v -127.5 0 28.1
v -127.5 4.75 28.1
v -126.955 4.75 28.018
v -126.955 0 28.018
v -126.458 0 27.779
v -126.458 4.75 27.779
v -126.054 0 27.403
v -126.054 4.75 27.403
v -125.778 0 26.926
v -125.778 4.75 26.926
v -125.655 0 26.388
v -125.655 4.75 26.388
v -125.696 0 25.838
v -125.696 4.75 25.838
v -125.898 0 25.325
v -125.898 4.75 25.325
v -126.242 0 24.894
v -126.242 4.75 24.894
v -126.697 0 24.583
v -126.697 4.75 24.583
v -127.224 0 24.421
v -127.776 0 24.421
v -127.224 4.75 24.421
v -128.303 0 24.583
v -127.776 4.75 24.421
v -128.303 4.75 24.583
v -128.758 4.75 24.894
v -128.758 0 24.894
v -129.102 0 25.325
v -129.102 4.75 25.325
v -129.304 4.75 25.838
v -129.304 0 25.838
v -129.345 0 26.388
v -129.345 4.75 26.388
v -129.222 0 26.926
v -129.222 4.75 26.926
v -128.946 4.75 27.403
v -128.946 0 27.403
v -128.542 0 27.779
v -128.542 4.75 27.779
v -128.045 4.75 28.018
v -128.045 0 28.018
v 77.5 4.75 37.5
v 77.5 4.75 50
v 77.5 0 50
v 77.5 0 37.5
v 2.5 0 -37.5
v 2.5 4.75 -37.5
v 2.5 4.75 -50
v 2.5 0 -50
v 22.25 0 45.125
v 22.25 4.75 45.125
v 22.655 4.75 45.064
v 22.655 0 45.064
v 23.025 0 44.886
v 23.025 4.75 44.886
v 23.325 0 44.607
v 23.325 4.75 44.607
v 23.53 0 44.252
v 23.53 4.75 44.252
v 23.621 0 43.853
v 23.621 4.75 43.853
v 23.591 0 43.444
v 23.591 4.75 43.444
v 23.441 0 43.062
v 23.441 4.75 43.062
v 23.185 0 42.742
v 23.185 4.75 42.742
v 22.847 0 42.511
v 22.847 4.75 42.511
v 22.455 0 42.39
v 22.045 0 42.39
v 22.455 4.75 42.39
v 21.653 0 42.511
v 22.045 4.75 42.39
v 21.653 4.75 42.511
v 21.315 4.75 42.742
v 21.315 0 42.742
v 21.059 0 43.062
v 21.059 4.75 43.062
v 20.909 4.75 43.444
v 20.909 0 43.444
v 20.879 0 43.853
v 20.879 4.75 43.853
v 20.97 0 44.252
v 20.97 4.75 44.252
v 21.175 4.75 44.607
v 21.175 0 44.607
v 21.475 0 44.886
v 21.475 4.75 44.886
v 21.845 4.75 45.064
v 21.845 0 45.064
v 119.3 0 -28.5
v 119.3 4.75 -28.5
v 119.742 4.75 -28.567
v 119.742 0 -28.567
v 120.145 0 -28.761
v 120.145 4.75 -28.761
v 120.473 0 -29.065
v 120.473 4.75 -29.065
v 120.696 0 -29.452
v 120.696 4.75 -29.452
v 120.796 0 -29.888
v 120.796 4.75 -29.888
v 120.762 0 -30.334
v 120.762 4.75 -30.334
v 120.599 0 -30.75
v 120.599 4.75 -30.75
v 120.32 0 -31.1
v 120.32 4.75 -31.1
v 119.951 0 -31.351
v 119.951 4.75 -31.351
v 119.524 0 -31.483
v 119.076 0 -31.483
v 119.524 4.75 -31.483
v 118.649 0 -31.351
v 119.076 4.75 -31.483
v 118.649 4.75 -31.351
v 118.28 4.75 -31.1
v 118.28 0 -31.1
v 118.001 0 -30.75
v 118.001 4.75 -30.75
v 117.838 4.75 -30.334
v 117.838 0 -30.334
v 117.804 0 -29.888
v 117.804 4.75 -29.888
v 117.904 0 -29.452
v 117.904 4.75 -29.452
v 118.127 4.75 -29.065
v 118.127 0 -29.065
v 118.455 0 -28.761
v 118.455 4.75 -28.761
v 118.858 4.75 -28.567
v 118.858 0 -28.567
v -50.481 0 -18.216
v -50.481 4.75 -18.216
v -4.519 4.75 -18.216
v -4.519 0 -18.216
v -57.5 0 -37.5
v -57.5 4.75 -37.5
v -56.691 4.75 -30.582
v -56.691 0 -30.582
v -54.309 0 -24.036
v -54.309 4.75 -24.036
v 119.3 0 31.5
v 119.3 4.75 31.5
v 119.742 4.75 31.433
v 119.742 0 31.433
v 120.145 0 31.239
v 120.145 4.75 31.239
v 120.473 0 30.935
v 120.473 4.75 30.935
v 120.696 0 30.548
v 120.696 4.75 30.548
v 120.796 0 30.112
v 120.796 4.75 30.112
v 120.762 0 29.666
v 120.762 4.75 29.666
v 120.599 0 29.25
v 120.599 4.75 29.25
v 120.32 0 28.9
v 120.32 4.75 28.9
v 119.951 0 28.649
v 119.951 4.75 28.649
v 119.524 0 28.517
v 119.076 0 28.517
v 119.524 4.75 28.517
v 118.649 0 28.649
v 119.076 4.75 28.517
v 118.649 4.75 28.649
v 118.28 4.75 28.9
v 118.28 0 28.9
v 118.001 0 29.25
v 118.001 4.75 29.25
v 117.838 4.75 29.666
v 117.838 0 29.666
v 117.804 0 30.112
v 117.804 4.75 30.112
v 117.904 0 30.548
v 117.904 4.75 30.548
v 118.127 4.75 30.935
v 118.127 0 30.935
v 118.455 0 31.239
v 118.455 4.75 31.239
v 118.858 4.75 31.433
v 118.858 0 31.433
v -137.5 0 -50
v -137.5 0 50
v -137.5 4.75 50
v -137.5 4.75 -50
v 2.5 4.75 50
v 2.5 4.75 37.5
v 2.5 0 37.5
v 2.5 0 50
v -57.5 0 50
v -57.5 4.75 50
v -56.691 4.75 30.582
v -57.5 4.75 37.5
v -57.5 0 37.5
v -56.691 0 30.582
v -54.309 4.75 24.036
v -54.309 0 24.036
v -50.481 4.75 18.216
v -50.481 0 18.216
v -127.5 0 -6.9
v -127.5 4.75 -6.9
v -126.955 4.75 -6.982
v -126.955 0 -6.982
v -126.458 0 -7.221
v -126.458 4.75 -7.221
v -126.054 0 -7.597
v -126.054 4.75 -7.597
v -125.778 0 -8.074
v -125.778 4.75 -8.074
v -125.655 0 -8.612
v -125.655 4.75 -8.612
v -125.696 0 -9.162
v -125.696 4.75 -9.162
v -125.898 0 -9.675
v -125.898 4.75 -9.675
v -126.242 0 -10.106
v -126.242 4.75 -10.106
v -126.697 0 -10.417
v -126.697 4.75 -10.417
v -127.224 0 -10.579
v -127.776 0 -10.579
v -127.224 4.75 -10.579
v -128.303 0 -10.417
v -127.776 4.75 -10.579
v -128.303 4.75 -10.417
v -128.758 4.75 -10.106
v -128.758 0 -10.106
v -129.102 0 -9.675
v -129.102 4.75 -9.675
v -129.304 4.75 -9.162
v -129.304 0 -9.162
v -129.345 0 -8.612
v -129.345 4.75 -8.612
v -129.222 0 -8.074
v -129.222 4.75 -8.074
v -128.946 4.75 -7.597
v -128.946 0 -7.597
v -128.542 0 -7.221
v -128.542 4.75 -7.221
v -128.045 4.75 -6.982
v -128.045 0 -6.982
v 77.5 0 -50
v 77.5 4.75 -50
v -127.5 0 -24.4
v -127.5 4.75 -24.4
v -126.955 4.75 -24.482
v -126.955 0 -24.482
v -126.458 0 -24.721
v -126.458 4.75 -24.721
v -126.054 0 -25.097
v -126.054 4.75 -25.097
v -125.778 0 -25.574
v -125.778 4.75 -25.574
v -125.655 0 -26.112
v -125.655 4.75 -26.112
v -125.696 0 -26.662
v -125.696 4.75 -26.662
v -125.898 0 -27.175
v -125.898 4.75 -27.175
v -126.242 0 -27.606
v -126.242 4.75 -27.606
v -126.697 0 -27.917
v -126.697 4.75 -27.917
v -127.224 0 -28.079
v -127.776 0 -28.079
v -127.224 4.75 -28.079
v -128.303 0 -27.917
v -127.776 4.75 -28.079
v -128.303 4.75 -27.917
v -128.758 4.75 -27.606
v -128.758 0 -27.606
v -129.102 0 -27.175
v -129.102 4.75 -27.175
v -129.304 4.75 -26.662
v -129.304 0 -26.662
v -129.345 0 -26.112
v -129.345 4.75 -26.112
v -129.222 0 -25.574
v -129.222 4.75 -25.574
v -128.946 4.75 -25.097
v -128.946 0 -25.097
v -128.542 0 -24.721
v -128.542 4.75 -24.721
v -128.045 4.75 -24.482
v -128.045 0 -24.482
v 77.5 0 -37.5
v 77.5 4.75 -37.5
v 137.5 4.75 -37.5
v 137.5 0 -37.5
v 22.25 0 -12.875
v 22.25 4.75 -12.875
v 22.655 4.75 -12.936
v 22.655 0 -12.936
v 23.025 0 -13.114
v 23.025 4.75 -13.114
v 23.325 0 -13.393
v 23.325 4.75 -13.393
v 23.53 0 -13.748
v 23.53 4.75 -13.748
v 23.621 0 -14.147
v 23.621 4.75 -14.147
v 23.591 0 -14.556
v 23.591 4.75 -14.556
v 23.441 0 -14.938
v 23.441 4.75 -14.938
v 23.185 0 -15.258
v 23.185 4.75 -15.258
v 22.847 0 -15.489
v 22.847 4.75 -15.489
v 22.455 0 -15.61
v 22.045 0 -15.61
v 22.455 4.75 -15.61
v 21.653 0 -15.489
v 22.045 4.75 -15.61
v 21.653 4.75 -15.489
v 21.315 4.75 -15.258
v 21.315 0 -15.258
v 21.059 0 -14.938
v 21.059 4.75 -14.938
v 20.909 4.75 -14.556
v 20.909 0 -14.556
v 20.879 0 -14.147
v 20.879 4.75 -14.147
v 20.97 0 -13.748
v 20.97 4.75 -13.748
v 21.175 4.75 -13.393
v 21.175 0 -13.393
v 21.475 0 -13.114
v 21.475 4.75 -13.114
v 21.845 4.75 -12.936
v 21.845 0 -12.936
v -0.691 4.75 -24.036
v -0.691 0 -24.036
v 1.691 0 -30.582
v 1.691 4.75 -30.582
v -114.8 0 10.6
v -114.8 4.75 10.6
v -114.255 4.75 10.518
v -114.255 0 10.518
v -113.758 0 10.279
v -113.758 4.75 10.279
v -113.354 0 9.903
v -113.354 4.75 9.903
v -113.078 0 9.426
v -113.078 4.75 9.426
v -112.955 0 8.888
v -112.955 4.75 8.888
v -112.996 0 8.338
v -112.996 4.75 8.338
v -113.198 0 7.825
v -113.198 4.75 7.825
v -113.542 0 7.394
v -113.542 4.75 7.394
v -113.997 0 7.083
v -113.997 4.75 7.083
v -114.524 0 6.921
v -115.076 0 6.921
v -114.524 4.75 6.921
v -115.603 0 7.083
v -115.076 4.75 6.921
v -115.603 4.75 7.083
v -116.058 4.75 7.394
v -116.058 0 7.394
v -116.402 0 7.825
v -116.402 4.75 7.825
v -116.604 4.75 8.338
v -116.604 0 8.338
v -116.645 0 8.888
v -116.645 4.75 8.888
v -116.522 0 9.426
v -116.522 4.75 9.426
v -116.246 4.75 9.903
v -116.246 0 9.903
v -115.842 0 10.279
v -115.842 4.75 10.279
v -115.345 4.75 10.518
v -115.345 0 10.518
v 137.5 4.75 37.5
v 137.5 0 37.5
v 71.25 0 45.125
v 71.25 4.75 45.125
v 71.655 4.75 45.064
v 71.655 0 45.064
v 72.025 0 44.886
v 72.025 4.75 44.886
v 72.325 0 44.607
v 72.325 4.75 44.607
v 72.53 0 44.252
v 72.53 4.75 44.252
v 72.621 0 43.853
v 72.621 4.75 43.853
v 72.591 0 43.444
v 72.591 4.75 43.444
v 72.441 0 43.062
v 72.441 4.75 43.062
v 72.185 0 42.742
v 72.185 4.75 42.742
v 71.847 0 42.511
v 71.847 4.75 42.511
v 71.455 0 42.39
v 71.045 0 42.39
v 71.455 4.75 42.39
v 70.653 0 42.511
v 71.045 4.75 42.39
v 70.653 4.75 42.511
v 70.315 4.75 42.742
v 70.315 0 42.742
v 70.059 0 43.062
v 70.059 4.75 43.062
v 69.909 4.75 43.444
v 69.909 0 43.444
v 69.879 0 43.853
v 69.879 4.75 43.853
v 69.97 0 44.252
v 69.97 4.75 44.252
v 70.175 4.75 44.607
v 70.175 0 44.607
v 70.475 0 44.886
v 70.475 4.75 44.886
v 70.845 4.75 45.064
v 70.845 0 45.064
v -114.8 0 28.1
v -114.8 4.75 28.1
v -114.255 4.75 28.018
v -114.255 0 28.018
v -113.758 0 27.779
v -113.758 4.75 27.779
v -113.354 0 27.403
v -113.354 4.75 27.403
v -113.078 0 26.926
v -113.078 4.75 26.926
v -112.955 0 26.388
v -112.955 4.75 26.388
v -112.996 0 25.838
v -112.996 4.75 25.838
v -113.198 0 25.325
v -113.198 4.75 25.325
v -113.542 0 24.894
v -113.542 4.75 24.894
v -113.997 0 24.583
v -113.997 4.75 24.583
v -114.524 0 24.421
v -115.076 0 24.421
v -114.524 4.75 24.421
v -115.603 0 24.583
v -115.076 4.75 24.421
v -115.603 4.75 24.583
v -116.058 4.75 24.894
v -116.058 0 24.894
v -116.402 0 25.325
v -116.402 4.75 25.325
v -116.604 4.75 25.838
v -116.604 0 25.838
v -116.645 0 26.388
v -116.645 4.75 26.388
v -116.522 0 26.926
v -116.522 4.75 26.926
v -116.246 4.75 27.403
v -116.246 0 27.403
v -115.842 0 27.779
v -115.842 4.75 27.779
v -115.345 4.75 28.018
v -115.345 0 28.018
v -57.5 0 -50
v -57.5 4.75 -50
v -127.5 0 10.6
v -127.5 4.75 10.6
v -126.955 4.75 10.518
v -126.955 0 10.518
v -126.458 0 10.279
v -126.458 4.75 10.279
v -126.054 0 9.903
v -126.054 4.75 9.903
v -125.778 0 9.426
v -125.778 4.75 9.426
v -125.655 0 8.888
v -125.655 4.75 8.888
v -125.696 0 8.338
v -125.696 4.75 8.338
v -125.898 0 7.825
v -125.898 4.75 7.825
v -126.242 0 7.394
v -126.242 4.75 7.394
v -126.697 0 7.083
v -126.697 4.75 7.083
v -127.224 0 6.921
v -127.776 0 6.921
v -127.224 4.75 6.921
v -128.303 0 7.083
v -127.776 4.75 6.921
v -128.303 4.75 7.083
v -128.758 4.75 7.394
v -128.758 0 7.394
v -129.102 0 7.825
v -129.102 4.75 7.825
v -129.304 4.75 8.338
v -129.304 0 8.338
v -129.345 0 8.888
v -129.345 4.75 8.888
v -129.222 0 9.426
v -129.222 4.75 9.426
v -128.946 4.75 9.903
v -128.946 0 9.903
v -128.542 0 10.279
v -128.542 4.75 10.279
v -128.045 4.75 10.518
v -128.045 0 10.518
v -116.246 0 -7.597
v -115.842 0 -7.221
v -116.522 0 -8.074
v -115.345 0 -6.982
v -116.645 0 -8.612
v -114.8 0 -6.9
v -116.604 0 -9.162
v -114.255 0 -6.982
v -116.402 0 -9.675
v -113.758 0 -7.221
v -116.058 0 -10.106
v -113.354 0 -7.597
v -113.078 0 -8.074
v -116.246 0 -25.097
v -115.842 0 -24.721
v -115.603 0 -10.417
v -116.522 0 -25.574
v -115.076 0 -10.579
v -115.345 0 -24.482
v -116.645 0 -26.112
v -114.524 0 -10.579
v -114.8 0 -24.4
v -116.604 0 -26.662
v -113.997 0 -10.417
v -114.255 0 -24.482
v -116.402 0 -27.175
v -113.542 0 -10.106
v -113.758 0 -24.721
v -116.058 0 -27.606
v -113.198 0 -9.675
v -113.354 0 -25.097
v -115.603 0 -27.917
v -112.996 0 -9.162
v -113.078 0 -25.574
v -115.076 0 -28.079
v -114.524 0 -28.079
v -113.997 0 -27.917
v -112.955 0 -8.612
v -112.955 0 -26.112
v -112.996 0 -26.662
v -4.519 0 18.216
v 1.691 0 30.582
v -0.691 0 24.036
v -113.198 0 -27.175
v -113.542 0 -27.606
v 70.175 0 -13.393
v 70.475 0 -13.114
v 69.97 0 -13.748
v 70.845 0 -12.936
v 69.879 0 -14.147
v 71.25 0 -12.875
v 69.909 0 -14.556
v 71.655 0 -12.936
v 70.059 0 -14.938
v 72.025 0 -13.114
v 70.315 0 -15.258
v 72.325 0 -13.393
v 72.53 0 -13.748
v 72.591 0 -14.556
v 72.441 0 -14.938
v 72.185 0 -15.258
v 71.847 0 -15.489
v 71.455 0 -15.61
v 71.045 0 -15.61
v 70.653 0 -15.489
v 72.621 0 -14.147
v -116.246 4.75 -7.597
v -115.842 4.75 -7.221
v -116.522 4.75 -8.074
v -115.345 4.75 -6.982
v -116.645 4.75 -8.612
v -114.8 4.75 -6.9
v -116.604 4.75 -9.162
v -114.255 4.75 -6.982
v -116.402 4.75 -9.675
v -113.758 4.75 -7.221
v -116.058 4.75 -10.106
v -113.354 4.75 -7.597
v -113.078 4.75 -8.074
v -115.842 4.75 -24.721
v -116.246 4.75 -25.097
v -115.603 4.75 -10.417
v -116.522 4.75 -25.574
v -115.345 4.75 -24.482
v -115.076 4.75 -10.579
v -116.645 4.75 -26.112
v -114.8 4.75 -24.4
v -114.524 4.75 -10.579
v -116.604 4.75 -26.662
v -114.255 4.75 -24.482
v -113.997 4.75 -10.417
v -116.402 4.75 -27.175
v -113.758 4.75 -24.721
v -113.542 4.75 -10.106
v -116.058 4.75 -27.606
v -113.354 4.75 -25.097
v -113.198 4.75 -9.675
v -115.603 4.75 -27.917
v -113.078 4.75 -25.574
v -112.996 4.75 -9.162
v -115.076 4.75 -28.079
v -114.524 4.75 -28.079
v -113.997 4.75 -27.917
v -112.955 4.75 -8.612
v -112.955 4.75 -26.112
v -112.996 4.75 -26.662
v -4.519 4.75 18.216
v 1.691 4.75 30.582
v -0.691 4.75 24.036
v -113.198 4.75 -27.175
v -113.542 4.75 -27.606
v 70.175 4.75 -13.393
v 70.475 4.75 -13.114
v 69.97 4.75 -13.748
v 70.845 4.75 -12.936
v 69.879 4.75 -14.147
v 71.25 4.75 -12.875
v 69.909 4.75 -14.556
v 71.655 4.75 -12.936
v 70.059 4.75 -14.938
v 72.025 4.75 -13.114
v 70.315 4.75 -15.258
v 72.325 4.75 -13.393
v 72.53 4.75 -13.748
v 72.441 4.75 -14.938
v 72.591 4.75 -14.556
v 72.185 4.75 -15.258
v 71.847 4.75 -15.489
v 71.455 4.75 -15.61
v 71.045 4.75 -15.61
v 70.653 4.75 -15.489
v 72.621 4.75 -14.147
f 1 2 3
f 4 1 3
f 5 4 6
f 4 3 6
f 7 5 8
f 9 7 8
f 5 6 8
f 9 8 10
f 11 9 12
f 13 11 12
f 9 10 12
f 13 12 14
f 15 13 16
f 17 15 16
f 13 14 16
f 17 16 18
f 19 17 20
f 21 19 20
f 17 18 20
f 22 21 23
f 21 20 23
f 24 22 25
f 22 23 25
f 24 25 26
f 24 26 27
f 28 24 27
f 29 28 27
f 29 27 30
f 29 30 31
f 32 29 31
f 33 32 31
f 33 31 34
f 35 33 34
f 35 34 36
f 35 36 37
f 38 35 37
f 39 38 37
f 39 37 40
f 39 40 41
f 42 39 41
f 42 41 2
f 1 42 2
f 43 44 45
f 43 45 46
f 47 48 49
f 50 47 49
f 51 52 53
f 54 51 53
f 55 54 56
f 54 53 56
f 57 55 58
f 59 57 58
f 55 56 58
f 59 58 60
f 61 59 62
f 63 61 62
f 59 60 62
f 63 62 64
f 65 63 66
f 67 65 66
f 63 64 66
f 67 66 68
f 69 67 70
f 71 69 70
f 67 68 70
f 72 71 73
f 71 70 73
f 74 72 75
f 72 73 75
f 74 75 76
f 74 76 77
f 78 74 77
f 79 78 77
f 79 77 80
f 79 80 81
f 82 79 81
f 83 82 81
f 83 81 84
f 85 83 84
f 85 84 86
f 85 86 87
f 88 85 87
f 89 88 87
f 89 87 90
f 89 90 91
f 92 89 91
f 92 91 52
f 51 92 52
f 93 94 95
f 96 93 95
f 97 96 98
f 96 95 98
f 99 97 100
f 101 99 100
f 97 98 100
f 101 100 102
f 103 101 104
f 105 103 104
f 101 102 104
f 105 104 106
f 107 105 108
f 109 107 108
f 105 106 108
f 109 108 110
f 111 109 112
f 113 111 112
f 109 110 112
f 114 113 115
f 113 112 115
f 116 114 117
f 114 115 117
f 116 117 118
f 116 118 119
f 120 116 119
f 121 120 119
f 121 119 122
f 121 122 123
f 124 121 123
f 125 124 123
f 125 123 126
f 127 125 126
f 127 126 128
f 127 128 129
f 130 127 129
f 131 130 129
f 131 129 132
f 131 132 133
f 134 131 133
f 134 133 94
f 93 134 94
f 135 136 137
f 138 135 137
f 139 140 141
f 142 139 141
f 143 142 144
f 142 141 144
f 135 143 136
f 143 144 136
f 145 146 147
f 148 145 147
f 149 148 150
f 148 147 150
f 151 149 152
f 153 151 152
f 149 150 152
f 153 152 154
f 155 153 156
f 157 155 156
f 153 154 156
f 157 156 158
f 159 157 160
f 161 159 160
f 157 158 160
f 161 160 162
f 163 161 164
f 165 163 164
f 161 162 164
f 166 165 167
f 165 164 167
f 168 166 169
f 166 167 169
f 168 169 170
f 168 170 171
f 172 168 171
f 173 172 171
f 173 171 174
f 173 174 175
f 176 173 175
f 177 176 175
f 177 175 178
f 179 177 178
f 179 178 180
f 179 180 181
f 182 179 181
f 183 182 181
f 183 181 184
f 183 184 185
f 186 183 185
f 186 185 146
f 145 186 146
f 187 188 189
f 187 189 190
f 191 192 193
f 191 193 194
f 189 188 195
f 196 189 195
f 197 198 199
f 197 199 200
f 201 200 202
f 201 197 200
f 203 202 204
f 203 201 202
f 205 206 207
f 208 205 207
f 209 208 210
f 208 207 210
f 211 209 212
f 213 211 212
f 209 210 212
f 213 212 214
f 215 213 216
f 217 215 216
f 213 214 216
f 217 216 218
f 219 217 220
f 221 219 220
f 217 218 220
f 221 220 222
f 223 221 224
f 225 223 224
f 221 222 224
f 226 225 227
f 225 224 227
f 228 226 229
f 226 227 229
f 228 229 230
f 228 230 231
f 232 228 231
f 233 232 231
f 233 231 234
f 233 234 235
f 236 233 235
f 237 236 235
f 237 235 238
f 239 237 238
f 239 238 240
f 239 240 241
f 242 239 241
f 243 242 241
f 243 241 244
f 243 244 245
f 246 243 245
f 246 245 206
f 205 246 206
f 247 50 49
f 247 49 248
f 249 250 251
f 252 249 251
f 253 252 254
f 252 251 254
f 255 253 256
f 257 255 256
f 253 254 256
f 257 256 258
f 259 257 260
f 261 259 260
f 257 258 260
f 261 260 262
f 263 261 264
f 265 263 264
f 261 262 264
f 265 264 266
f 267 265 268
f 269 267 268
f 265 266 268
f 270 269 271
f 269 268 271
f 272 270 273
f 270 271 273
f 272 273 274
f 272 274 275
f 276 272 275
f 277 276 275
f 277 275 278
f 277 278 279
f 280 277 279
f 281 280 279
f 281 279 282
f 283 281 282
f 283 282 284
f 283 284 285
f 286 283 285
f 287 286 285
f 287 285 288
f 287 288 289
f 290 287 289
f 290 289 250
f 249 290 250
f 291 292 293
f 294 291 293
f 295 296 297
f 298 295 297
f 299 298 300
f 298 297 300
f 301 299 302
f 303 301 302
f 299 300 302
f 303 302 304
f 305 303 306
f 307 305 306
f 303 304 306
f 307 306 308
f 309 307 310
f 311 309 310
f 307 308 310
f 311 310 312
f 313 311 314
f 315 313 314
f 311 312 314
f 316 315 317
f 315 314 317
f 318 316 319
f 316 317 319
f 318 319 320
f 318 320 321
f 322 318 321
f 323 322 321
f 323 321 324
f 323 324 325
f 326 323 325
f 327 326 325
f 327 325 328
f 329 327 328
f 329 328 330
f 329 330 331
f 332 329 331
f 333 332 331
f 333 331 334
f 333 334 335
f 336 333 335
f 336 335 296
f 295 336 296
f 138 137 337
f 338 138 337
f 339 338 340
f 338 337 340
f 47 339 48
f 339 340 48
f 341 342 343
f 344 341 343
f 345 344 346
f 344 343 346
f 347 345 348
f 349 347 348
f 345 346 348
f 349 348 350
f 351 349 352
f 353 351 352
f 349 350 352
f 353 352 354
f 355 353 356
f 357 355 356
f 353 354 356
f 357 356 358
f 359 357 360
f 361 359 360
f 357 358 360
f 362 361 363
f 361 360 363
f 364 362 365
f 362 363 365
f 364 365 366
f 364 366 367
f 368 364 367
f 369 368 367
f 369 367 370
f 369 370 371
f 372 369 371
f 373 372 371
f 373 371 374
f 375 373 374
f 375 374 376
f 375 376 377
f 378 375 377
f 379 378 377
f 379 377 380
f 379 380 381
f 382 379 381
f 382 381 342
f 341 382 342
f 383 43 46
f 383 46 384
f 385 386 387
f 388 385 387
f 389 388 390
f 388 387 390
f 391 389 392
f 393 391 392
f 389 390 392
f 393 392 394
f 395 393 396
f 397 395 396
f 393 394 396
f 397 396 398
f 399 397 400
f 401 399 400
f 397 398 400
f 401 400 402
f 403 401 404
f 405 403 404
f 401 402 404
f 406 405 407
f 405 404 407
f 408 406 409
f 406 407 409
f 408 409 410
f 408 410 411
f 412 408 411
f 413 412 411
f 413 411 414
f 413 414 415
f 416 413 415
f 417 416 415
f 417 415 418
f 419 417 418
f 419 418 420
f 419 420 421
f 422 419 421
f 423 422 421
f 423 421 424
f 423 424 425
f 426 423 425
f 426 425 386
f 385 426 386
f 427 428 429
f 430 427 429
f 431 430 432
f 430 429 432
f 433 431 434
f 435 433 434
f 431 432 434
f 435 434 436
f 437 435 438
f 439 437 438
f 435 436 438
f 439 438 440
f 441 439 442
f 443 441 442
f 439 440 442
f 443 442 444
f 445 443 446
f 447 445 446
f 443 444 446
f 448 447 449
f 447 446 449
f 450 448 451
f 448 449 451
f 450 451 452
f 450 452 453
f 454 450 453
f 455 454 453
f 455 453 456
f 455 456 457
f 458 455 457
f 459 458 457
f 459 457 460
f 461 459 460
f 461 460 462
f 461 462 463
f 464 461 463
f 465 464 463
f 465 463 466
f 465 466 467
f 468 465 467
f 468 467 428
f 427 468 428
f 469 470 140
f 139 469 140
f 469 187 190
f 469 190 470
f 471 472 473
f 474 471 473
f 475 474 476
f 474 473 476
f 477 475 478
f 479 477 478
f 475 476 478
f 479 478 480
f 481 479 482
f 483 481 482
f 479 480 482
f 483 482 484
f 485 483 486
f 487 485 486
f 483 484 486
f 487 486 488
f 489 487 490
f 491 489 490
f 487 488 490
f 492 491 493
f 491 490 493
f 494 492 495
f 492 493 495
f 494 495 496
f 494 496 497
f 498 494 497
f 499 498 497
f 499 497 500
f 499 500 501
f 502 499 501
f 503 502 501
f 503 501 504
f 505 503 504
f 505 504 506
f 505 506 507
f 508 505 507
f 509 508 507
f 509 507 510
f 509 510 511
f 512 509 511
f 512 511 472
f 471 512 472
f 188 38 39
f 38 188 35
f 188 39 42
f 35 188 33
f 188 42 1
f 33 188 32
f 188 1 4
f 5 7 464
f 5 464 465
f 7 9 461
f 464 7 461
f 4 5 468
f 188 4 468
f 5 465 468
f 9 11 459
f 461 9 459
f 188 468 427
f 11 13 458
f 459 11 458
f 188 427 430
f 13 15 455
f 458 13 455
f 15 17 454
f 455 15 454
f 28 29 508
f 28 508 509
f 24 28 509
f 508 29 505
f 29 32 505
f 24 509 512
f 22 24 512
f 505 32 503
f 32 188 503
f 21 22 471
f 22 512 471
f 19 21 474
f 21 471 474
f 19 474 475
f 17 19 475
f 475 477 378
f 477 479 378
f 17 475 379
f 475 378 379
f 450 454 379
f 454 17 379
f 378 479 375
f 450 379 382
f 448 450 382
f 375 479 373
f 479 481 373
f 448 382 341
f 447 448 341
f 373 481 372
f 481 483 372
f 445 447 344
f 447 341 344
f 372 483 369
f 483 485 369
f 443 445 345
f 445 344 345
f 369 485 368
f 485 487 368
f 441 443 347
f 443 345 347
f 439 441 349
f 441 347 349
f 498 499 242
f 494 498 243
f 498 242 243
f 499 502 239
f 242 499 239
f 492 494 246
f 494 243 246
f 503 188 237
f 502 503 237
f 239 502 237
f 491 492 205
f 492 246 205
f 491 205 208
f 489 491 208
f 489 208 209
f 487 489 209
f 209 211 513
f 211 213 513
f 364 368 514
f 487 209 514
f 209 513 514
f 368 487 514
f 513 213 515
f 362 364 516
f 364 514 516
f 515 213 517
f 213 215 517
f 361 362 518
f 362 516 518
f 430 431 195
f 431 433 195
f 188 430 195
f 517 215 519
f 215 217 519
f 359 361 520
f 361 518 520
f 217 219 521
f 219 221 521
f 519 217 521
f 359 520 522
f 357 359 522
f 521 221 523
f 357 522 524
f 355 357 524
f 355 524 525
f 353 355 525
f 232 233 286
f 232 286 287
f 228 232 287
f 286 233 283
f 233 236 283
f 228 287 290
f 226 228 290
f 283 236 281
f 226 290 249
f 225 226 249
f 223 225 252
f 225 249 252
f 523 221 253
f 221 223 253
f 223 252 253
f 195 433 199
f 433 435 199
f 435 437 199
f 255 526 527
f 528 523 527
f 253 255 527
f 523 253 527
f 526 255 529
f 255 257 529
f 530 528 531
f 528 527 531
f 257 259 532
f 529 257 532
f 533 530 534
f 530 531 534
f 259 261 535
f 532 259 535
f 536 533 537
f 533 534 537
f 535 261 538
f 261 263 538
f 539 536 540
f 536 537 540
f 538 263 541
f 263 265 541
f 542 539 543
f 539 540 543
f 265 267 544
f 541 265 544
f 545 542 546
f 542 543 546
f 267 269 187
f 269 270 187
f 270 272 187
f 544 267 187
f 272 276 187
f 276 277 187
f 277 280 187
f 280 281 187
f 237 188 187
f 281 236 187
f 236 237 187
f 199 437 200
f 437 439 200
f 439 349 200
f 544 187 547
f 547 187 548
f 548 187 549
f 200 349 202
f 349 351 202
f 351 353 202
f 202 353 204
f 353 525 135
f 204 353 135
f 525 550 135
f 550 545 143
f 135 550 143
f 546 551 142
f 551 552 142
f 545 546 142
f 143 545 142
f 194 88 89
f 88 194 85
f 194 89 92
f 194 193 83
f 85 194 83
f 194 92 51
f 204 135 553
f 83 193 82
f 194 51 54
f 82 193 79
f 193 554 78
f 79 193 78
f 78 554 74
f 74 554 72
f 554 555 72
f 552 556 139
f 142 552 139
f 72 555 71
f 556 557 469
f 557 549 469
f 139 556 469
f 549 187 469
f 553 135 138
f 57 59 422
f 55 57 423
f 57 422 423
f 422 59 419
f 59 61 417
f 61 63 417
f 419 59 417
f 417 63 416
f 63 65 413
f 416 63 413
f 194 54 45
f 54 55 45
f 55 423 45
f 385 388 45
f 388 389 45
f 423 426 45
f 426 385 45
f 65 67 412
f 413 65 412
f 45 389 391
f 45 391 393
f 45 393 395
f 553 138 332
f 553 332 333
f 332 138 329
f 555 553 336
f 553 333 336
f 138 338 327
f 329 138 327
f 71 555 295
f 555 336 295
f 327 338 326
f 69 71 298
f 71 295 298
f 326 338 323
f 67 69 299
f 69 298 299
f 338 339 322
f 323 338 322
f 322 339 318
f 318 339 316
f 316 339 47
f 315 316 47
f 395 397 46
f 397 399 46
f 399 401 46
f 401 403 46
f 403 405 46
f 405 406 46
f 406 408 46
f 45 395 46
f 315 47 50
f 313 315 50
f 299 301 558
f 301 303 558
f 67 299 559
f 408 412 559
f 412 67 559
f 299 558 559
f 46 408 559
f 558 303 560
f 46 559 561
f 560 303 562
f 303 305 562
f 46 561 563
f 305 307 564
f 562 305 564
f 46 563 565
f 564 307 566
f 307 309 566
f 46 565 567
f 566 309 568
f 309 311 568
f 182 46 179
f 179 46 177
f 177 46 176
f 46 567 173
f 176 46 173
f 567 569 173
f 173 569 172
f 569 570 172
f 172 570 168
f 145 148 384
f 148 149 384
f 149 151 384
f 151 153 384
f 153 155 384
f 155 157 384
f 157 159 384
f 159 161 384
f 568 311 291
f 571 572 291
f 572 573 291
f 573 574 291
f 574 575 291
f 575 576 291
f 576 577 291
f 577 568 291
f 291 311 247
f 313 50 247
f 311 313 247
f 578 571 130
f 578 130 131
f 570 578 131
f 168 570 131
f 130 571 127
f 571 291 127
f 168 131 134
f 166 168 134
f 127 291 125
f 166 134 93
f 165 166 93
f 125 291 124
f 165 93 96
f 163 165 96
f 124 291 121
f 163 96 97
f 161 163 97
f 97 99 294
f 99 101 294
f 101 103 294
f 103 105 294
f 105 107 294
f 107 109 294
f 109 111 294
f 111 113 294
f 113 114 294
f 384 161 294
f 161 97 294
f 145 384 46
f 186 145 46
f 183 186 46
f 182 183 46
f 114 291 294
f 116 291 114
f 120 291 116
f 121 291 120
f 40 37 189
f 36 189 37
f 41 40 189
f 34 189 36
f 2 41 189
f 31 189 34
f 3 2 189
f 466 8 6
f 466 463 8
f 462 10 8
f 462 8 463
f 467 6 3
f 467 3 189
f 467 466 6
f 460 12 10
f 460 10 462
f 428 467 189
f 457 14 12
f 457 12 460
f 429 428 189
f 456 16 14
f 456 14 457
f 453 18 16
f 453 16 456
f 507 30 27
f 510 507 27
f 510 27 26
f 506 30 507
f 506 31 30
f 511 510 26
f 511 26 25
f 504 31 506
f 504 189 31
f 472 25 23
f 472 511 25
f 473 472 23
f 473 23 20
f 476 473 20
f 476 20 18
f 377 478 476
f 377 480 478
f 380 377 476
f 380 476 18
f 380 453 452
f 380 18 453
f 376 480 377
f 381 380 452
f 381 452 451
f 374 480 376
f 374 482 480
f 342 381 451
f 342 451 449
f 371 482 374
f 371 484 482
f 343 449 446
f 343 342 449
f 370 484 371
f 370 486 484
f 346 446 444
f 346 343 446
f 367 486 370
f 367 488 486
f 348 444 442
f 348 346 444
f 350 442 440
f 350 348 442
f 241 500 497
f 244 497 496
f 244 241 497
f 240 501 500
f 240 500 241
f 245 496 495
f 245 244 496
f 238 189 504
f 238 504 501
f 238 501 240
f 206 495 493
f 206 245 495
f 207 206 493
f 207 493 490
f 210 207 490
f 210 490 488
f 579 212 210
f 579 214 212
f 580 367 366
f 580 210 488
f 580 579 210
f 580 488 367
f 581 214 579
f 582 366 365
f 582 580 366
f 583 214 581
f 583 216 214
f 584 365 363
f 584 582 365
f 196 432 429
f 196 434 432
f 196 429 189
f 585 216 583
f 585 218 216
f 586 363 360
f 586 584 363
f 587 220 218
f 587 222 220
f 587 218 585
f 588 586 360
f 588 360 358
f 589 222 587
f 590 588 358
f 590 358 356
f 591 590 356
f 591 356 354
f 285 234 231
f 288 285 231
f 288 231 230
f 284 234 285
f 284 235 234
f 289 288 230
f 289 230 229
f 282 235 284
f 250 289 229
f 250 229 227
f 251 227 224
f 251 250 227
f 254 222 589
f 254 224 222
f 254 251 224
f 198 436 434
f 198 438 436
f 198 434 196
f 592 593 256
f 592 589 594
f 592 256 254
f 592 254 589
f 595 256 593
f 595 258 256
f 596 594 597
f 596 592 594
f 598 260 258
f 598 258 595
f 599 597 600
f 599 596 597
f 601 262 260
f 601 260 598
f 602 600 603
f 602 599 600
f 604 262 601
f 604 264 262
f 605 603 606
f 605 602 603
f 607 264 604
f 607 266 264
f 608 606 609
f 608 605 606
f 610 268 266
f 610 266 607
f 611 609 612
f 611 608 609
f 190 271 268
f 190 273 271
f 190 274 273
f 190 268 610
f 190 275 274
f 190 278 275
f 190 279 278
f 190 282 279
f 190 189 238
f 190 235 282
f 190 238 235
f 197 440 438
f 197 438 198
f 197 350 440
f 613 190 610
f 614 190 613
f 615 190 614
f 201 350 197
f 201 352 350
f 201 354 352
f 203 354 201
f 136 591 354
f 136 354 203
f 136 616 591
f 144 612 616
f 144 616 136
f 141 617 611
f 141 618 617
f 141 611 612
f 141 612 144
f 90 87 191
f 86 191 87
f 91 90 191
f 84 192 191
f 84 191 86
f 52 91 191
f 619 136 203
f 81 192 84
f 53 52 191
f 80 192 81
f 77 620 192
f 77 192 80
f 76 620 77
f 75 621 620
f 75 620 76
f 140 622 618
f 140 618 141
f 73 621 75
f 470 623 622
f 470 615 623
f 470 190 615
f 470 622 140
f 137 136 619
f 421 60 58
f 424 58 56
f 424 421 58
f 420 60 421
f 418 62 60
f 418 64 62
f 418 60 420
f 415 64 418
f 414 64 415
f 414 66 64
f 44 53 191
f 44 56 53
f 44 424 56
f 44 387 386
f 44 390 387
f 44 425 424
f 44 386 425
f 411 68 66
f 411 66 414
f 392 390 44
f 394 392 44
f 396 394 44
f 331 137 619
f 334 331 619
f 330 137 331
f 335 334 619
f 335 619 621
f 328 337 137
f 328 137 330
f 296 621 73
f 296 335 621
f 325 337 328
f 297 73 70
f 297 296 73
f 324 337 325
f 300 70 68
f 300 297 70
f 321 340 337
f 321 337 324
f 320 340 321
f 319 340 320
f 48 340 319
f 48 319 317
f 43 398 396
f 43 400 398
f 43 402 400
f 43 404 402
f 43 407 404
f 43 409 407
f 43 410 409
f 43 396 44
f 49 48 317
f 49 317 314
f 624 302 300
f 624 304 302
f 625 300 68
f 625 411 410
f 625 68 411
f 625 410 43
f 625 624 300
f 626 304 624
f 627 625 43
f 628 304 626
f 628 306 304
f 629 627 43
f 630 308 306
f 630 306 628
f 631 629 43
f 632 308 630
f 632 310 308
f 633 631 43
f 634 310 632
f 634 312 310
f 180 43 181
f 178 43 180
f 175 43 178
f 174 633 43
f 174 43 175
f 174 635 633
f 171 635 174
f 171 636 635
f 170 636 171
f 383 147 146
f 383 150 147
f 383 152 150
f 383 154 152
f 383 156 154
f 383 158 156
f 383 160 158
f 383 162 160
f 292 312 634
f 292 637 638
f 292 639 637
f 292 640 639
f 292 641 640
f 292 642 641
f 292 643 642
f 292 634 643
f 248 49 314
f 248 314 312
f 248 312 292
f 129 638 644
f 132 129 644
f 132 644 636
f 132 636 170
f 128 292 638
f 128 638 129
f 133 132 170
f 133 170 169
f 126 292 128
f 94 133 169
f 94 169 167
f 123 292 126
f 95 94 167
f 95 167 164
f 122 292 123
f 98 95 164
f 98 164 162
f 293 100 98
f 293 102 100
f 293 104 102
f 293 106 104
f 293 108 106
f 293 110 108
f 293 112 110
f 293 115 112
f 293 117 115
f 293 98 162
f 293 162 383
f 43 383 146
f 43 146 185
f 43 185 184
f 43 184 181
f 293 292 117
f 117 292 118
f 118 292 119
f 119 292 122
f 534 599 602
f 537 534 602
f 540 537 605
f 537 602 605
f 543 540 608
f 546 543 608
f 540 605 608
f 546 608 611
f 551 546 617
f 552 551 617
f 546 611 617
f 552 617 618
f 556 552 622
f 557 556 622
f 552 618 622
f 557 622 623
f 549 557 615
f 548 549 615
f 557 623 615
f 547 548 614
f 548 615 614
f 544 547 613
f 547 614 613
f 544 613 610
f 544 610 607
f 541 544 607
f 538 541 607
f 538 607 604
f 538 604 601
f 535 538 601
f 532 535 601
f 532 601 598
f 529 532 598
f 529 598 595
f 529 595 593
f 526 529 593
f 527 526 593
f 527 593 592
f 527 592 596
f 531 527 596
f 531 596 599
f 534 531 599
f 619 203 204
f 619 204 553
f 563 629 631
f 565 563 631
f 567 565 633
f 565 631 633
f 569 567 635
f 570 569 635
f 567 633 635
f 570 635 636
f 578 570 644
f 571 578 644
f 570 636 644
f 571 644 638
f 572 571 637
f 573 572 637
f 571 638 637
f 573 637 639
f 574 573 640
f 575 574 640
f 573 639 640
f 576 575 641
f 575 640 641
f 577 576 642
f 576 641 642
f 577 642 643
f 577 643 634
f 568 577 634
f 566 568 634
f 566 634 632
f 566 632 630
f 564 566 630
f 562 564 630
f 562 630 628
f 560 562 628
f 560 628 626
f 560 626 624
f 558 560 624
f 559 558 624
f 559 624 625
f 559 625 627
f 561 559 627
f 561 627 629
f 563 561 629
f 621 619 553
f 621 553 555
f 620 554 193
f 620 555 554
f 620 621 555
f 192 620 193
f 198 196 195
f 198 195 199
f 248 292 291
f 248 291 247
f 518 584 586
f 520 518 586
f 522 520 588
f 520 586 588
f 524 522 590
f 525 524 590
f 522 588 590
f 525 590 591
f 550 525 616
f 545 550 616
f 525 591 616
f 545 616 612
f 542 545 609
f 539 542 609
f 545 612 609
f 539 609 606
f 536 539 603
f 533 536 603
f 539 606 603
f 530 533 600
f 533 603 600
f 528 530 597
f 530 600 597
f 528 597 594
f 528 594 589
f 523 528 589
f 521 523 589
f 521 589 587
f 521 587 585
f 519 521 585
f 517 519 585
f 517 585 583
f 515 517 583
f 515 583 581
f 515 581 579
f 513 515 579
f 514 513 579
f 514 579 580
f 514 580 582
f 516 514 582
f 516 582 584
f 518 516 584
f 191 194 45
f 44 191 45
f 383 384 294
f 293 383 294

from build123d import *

# Parameters (mm, degrees)
SKETCH1_W           = 275
SKETCH1_H           = 100
BOSS_EXTRUDE4_DEPTH = 4.75
SKETCH3_R           = 1.5
SKETCH3_W           = 60
SKETCH3_H           = 12.5
CUT_EXTRUDE1_DEPTH  = 10
SKETCH4_R           = 1.85
SKETCH4_R_2         = 1.375
CUT_EXTRUDE2_DEPTH  = 10


with BuildPart() as part:
    # Sketch1 → Boss-Extrude4 (new body)
    with BuildSketch(Plane(origin=(0, 0, 0), x_dir=(1, 0, 0), z_dir=(0, 1, 0))):
        Rectangle(SKETCH1_W, SKETCH1_H)
    extrude(amount=BOSS_EXTRUDE4_DEPTH)

    # Sketch3 → Cut-Extrude1 (cut)
    with BuildSketch(Plane(origin=(0, 4.75, 0), x_dir=(1, 0, 0), z_dir=(0, 1, 0))):
        with Locations(Location((119.3, -30, 0), (0, 0, 270))):
            Circle(SKETCH3_R)
        with Locations(Location((119.3, 30, 0), (0, 0, 270))):
            Circle(SKETCH3_R)
        with Locations((107.5, -43.75)):
            Rectangle(SKETCH3_W, SKETCH3_H)
        with Locations((107.5, 43.75)):
            Rectangle(SKETCH3_W, SKETCH3_H)
        with BuildLine():
            Line((2.5, -50), (-57.5, -50))
            Line((-57.5, -50), (-57.5, -37.5))
            ThreePointArc((-57.5, -37.5), (-55.690778624, -27.2393957), (-50.481333294, -18.216371709))
            Line((-50.481333294, -18.216371709), (-4.518666706, -18.216371709))
            ThreePointArc((-4.518666706, -18.216371709), (0.690778624, -27.2393957), (2.5, -37.5))
            Line((2.5, -37.5), (2.5, -50))
        make_face()
        with BuildLine():
            Line((2.5, 50), (-57.5, 50))
            Line((-57.5, 50), (-57.5, 37.5))
            ThreePointArc((-57.5, 37.5), (-55.690778624, 27.2393957), (-50.481333294, 18.216371709))
            Line((-50.481333294, 18.216371709), (-4.518666706, 18.216371709))
            ThreePointArc((-4.518666706, 18.216371709), (0.690778624, 27.2393957), (2.5, 37.5))
            Line((2.5, 37.5), (2.5, 50))
        make_face()
    extrude(amount=-CUT_EXTRUDE1_DEPTH, mode=Mode.SUBTRACT)

    # Sketch4 → Cut-Extrude2 (cut)
    with BuildSketch(Plane(origin=(0, 4.75, 0), x_dir=(1, 0, 0), z_dir=(0, 1, 0))):
        with Locations(Location((-127.5, -26.25, 0), (0, 0, 270))):
            Circle(SKETCH4_R)
        with Locations(Location((-114.8, -26.25, 0), (0, 0, 270))):
            Circle(SKETCH4_R)
        with Locations(Location((-127.5, -8.75, 0), (0, 0, 270))):
            Circle(SKETCH4_R)
        with Locations(Location((-114.8, -8.75, 0), (0, 0, 270))):
            Circle(SKETCH4_R)
        with Locations(Location((-114.8, 8.75, 0), (0, 0, 270))):
            Circle(SKETCH4_R)
        with Locations(Location((-127.5, 8.75, 0), (0, 0, 270))):
            Circle(SKETCH4_R)
        with Locations(Location((-114.8, 26.25, 0), (0, 0, 270))):
            Circle(SKETCH4_R)
        with Locations(Location((-127.5, 26.25, 0), (0, 0, 270))):
            Circle(SKETCH4_R)
        with Locations(Location((71.25, -43.75, 0), (0, 0, 270))):
            Circle(SKETCH4_R_2)
        with Locations(Location((22.25, -43.75, 0), (0, 0, 270))):
            Circle(SKETCH4_R_2)
        with Locations(Location((71.25, 14.25, 0), (0, 0, 270))):
            Circle(SKETCH4_R_2)
        with Locations(Location((22.25, 14.25, 0), (0, 0, 270))):
            Circle(SKETCH4_R_2)
    extrude(amount=-CUT_EXTRUDE2_DEPTH, mode=Mode.SUBTRACT)


solid = part.part
